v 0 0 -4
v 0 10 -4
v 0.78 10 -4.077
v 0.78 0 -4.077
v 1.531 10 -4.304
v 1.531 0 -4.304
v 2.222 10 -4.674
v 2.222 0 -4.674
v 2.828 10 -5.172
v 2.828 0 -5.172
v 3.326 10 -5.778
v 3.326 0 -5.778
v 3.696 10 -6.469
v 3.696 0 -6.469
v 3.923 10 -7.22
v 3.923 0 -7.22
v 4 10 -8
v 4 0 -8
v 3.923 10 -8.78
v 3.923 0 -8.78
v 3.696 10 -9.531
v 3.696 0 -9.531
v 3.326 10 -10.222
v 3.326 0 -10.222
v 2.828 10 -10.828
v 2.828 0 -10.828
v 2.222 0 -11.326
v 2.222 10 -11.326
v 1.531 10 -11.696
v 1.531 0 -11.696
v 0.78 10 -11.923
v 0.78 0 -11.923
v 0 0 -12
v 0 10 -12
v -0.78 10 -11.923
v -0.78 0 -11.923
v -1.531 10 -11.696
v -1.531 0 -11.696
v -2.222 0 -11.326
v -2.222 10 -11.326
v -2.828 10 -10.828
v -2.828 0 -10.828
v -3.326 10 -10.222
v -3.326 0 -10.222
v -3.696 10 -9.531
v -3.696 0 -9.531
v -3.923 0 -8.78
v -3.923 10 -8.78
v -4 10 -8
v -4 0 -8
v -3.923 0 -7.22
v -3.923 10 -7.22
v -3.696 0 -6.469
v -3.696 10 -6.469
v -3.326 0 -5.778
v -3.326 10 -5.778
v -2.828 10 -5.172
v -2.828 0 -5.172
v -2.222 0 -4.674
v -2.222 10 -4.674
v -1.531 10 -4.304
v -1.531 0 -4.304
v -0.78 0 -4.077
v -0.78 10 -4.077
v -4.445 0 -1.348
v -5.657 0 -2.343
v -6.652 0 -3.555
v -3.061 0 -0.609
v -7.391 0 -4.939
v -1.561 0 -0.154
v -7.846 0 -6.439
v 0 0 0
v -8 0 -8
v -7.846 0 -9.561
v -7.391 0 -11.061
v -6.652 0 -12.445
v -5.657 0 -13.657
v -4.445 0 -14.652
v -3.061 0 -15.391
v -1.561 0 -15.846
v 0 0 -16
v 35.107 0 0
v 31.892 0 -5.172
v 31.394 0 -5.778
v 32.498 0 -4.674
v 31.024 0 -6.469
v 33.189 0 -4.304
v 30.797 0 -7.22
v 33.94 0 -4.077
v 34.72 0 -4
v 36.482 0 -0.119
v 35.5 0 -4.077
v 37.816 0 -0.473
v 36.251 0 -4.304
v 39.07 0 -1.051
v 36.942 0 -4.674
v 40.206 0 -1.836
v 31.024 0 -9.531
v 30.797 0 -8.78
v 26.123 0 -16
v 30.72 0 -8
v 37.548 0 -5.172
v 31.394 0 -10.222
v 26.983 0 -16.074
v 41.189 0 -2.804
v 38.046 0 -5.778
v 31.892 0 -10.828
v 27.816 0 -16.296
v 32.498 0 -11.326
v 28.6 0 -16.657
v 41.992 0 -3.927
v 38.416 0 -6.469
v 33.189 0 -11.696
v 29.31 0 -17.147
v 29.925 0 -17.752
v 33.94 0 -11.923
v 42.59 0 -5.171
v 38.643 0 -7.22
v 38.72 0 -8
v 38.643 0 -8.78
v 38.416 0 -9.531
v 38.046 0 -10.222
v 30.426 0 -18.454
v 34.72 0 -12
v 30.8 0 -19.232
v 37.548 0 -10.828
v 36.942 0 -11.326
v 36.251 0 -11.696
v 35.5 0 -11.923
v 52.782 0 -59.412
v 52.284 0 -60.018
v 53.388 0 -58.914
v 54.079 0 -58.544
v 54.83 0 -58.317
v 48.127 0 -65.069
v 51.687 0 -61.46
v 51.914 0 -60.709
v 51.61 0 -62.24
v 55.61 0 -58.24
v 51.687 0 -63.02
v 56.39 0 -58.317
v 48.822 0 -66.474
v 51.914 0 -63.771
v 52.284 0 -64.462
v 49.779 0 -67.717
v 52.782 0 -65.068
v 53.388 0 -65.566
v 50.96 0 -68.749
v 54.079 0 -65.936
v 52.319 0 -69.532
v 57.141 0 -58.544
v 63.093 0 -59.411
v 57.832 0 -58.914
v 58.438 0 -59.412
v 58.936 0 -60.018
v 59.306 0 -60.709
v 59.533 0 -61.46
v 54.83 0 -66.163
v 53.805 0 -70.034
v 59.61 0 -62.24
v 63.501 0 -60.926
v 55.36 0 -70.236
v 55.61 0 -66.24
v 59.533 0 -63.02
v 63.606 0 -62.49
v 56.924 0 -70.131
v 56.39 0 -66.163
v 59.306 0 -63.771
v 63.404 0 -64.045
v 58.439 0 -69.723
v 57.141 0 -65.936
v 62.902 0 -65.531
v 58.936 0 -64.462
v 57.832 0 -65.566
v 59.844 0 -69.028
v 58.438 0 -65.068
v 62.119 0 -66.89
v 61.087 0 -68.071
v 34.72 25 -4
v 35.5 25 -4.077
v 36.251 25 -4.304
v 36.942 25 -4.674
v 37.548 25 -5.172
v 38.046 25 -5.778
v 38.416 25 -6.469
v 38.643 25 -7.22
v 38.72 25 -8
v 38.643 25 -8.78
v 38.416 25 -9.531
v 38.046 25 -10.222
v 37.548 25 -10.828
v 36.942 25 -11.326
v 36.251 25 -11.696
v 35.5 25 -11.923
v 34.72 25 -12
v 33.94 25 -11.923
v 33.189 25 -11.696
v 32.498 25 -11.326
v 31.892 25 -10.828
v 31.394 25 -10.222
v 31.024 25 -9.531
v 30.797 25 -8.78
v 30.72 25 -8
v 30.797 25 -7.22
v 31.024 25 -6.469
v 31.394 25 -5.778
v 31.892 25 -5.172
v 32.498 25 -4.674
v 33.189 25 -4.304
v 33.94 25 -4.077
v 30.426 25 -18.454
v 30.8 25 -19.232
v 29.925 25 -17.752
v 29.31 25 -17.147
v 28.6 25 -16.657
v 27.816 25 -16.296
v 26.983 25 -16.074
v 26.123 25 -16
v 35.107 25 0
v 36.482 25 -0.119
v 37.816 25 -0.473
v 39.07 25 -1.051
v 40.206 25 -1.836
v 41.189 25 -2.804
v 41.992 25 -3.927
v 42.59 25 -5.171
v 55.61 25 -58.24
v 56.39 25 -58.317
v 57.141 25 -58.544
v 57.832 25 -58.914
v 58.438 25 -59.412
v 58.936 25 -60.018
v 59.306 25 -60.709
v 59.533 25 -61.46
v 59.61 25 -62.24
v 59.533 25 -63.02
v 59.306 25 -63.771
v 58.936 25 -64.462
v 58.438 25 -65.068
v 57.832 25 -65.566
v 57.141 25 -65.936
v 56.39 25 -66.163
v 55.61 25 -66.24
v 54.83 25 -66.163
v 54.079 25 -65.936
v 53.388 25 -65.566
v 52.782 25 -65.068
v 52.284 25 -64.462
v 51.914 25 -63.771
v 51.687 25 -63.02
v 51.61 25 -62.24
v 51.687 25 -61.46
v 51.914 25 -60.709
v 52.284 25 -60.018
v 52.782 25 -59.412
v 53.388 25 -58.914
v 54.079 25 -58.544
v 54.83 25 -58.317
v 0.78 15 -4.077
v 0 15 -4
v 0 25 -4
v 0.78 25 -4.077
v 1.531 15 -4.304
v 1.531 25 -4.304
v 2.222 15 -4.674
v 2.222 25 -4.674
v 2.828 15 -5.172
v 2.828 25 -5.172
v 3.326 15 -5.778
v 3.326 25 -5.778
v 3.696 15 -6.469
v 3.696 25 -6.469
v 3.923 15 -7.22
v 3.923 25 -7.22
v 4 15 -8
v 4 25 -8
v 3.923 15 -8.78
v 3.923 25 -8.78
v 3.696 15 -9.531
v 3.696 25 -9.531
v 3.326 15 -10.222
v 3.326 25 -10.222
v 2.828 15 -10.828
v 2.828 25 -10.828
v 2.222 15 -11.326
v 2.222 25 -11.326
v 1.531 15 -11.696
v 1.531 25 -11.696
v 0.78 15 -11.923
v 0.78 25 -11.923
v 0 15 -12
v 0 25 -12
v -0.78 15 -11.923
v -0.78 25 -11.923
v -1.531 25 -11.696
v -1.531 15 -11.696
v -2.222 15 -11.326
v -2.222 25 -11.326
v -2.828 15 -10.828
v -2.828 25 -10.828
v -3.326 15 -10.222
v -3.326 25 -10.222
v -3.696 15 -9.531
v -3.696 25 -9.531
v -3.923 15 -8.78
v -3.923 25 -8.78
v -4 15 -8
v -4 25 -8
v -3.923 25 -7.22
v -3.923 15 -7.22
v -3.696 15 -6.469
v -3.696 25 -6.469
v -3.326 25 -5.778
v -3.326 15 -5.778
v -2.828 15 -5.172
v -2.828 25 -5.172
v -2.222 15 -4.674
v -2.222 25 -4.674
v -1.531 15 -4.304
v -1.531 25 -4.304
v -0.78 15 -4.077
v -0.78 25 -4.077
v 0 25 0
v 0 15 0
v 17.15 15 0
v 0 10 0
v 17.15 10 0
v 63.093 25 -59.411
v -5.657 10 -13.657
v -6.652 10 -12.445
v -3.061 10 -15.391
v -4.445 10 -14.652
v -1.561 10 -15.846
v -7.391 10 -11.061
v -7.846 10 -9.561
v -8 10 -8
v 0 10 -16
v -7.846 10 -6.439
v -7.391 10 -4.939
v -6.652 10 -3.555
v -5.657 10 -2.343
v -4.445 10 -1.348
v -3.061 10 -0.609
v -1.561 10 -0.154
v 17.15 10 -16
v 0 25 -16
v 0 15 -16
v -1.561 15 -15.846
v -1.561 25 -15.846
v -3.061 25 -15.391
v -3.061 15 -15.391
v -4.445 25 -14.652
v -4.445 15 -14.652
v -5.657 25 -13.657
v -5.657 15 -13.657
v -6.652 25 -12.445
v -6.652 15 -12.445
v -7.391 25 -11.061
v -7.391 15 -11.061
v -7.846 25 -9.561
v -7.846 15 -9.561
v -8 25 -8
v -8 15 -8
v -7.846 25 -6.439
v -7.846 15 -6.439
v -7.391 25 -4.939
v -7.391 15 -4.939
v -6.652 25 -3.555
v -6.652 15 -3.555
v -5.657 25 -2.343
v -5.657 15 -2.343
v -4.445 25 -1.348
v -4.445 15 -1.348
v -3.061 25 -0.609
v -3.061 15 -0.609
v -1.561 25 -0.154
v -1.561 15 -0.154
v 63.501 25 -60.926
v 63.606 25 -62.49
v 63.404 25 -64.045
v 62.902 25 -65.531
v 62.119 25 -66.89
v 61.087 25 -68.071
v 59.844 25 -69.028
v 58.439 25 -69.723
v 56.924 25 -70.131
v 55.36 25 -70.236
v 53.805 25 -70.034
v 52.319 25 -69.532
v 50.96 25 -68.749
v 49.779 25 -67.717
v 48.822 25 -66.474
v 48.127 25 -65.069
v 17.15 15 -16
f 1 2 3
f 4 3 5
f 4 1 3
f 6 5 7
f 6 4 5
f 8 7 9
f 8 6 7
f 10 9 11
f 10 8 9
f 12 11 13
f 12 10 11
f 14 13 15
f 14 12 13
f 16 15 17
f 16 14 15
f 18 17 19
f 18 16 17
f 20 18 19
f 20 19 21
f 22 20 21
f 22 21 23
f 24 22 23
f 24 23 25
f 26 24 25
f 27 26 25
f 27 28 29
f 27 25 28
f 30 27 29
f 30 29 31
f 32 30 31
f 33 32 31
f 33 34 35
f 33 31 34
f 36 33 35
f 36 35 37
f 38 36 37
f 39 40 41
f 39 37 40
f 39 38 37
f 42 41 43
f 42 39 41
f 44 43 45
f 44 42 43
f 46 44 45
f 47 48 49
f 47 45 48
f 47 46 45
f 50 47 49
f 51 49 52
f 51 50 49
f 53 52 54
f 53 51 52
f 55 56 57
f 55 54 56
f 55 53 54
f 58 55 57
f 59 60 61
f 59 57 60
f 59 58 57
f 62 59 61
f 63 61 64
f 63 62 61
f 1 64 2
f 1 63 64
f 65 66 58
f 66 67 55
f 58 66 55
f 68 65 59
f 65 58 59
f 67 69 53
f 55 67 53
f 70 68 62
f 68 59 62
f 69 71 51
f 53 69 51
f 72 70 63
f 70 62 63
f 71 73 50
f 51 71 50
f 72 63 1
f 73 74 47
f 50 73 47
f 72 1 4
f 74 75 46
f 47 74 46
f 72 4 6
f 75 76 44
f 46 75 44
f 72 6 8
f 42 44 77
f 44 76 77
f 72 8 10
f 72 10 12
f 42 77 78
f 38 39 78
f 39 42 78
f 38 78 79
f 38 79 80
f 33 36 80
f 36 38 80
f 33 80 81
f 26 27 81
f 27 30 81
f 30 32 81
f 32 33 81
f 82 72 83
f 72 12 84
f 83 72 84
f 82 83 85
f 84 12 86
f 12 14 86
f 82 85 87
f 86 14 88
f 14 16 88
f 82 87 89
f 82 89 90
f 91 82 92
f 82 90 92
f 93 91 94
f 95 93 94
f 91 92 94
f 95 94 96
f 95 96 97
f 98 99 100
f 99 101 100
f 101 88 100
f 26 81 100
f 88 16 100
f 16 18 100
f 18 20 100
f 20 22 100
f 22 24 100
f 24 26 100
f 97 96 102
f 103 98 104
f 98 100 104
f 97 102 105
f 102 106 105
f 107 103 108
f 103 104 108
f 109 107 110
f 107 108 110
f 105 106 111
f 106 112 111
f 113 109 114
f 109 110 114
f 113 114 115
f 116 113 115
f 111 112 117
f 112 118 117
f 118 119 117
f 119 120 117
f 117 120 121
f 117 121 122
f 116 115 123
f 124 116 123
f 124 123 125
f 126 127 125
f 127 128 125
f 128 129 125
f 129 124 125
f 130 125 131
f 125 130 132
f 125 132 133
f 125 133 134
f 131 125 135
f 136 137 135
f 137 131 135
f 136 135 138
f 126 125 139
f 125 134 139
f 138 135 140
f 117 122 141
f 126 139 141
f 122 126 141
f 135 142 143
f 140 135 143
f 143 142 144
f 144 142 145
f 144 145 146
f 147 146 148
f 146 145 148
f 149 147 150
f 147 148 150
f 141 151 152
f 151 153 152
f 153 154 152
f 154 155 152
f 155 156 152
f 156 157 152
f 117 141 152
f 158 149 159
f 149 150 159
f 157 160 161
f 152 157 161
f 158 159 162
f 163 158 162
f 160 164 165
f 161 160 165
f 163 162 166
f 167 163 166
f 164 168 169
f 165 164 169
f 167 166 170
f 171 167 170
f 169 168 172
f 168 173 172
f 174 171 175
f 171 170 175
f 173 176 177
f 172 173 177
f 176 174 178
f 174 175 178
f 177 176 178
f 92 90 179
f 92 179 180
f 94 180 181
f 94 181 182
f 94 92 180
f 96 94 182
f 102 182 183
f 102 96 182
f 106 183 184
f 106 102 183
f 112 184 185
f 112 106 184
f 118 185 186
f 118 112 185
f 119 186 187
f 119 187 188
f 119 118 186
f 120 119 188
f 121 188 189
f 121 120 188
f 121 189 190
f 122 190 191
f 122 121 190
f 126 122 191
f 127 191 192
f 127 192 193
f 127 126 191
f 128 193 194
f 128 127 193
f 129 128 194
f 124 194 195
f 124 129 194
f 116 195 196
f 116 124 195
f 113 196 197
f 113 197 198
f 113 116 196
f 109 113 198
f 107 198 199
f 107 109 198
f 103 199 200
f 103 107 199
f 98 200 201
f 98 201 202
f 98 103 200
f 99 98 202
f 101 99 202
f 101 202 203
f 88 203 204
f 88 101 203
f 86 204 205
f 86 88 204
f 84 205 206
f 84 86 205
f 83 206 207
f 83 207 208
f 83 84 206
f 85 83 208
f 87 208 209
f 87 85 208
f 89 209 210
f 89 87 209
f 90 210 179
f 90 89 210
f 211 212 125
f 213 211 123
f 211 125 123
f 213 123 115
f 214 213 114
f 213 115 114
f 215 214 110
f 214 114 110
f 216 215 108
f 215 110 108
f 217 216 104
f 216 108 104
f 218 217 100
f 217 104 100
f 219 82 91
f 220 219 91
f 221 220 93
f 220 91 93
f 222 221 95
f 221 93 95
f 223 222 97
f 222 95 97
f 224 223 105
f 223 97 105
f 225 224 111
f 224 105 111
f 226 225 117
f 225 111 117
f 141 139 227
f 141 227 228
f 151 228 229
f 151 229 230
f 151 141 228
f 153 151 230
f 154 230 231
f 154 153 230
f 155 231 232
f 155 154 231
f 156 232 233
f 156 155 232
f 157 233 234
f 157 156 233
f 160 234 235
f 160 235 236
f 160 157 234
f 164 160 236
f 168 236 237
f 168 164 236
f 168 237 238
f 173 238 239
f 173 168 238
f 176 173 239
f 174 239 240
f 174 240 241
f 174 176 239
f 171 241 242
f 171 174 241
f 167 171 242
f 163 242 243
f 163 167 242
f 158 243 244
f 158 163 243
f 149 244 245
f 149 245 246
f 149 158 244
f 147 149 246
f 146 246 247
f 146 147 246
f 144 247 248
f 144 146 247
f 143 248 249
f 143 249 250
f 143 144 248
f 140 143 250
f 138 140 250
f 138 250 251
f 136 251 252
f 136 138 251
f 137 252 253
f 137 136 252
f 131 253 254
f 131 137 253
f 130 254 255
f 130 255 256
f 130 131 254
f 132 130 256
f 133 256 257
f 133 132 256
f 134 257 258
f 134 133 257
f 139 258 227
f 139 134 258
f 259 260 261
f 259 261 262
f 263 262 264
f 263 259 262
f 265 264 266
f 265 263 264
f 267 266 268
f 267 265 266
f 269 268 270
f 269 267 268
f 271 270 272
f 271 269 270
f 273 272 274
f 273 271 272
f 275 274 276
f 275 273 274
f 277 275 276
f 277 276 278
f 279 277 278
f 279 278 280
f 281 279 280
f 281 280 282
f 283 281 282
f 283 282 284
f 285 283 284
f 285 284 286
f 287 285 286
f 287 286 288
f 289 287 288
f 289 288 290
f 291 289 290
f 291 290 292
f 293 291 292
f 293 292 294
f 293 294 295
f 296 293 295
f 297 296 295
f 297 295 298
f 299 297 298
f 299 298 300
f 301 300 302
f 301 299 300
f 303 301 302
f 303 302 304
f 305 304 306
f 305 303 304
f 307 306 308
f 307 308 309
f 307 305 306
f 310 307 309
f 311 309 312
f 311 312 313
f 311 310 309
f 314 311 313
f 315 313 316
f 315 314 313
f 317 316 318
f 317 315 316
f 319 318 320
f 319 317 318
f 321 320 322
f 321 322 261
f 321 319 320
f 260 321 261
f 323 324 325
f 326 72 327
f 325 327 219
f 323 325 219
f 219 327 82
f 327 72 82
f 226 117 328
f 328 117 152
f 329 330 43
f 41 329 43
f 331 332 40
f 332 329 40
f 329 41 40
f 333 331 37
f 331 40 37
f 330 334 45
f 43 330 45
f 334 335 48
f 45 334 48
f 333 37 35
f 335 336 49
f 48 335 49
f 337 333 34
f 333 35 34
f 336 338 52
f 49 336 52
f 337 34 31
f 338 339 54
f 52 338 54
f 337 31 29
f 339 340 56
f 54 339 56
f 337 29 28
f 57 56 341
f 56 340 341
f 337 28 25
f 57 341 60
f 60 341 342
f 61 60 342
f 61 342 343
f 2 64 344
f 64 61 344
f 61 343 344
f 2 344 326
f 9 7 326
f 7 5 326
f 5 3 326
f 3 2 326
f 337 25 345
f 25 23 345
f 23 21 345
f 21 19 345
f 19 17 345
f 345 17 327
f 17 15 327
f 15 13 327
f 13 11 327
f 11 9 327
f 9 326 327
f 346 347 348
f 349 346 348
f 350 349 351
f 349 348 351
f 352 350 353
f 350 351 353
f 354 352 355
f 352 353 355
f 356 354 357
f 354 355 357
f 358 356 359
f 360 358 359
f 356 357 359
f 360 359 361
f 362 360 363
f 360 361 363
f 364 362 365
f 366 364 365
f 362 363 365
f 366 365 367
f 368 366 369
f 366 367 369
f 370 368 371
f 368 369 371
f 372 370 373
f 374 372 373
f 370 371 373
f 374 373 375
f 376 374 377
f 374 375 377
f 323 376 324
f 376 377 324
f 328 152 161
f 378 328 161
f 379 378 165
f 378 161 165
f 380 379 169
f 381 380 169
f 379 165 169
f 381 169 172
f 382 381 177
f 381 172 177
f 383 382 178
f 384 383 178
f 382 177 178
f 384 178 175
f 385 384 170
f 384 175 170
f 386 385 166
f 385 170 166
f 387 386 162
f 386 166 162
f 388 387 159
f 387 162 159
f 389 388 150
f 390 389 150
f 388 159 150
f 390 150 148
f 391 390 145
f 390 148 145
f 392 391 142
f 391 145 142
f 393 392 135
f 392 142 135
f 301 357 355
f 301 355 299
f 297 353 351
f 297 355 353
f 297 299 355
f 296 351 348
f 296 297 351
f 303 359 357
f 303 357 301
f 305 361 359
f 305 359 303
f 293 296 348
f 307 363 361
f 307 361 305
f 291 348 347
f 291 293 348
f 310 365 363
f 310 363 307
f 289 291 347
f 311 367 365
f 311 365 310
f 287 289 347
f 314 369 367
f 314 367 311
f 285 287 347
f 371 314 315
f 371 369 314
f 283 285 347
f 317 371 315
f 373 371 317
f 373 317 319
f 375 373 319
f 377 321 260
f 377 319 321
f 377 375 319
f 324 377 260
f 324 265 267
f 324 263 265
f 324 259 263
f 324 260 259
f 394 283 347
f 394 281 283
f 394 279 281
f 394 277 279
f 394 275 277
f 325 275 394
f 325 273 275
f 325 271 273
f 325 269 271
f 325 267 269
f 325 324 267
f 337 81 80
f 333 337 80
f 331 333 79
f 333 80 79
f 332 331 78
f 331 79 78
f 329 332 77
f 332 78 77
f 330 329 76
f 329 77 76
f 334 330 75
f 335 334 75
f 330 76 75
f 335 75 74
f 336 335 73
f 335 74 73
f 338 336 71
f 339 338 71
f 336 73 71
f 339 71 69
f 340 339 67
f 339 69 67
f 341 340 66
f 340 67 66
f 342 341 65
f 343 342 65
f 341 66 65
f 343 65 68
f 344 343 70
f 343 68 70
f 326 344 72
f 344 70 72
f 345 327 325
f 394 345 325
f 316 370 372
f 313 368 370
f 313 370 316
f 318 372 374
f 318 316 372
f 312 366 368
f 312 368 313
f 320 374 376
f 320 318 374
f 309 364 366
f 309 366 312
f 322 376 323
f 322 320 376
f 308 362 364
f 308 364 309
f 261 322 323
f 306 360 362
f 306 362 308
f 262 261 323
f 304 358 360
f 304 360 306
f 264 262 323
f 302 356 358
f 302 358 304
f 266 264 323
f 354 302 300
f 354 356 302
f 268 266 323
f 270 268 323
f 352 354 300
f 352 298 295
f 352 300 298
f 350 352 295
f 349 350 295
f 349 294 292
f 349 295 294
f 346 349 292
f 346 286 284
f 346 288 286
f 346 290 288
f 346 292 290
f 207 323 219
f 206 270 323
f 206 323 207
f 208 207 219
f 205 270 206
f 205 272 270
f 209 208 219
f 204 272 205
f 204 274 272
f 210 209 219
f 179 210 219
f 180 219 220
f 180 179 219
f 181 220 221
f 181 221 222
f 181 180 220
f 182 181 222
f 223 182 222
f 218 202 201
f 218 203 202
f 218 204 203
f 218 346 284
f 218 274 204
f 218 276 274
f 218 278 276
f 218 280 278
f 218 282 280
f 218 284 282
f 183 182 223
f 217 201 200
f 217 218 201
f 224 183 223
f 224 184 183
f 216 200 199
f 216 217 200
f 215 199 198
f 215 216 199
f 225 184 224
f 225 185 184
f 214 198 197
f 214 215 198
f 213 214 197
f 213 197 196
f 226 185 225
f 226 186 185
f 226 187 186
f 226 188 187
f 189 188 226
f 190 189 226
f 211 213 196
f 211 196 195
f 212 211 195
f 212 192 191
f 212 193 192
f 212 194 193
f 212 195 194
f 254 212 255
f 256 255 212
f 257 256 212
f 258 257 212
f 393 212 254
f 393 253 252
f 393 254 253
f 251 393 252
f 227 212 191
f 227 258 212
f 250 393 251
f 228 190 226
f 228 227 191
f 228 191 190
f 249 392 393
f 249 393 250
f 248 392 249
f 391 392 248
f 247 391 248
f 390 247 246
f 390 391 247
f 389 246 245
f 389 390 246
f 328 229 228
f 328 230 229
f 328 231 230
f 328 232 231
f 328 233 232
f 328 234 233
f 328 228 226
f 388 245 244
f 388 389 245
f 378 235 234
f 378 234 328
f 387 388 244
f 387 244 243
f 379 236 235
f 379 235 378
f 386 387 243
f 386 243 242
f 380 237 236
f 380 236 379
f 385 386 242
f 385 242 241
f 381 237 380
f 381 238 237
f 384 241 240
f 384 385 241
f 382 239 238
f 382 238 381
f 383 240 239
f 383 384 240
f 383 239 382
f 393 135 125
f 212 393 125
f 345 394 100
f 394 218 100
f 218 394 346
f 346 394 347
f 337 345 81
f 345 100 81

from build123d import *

# Parameters (mm, degrees)
SKETCH1_R           = 4
BOSS_EXTRUDE1_DEPTH = 25
SKETCH2_W           = 25.15
SKETCH2_H           = 5
CUT_EXTRUDE1_DEPTH  = 20


with BuildPart() as part:
    # Sketch1 → Boss-Extrude1 (new body)
    with BuildSketch(Plane(origin=(0, 0, 0), x_dir=(1, 0, 0), z_dir=(0, 1, 0))):
        with BuildLine():
            Line((0, 0), (35.106623938, 0))
            ThreePointArc((35.106623938, 0), (39.654705316, 1.418590137), (42.589820847, 5.171261055))
            Line((42.589820847, 5.171261055), (63.093196909, 59.411261055))
            ThreePointArc((63.093196909, 59.411261055), (58.438738945, 69.723196909), (48.126803091, 65.068738945))
            Line((48.126803091, 65.068738945), (30.799975774, 19.232038159))
            ThreePointArc((30.799975774, 19.232038159), (28.965528567, 16.886618836), (26.122977706, 16))
            Line((26.122977706, 16), (0, 16))
            ThreePointArc((0, 16), (-8, 8), (0, 0))
        make_face()
        with Locations(Location((0, 8, 0), (0, 0, 270))):
            Circle(SKETCH1_R, mode=Mode.SUBTRACT)
        with Locations(Location((55.61, 62.24, 0), (0, 0, 270))):
            Circle(SKETCH1_R, mode=Mode.SUBTRACT)
        with Locations(Location((34.72, 8, 0), (0, 0, 270))):
            Circle(SKETCH1_R, mode=Mode.SUBTRACT)
    extrude(amount=BOSS_EXTRUDE1_DEPTH)

    # Sketch2 → Cut-Extrude1 (cut)
    with BuildSketch(Plane.XY):
        with Locations((4.575, 12.5)):
            Rectangle(SKETCH2_W, SKETCH2_H)
    extrude(amount=-CUT_EXTRUDE1_DEPTH, mode=Mode.SUBTRACT)


solid = part.part
